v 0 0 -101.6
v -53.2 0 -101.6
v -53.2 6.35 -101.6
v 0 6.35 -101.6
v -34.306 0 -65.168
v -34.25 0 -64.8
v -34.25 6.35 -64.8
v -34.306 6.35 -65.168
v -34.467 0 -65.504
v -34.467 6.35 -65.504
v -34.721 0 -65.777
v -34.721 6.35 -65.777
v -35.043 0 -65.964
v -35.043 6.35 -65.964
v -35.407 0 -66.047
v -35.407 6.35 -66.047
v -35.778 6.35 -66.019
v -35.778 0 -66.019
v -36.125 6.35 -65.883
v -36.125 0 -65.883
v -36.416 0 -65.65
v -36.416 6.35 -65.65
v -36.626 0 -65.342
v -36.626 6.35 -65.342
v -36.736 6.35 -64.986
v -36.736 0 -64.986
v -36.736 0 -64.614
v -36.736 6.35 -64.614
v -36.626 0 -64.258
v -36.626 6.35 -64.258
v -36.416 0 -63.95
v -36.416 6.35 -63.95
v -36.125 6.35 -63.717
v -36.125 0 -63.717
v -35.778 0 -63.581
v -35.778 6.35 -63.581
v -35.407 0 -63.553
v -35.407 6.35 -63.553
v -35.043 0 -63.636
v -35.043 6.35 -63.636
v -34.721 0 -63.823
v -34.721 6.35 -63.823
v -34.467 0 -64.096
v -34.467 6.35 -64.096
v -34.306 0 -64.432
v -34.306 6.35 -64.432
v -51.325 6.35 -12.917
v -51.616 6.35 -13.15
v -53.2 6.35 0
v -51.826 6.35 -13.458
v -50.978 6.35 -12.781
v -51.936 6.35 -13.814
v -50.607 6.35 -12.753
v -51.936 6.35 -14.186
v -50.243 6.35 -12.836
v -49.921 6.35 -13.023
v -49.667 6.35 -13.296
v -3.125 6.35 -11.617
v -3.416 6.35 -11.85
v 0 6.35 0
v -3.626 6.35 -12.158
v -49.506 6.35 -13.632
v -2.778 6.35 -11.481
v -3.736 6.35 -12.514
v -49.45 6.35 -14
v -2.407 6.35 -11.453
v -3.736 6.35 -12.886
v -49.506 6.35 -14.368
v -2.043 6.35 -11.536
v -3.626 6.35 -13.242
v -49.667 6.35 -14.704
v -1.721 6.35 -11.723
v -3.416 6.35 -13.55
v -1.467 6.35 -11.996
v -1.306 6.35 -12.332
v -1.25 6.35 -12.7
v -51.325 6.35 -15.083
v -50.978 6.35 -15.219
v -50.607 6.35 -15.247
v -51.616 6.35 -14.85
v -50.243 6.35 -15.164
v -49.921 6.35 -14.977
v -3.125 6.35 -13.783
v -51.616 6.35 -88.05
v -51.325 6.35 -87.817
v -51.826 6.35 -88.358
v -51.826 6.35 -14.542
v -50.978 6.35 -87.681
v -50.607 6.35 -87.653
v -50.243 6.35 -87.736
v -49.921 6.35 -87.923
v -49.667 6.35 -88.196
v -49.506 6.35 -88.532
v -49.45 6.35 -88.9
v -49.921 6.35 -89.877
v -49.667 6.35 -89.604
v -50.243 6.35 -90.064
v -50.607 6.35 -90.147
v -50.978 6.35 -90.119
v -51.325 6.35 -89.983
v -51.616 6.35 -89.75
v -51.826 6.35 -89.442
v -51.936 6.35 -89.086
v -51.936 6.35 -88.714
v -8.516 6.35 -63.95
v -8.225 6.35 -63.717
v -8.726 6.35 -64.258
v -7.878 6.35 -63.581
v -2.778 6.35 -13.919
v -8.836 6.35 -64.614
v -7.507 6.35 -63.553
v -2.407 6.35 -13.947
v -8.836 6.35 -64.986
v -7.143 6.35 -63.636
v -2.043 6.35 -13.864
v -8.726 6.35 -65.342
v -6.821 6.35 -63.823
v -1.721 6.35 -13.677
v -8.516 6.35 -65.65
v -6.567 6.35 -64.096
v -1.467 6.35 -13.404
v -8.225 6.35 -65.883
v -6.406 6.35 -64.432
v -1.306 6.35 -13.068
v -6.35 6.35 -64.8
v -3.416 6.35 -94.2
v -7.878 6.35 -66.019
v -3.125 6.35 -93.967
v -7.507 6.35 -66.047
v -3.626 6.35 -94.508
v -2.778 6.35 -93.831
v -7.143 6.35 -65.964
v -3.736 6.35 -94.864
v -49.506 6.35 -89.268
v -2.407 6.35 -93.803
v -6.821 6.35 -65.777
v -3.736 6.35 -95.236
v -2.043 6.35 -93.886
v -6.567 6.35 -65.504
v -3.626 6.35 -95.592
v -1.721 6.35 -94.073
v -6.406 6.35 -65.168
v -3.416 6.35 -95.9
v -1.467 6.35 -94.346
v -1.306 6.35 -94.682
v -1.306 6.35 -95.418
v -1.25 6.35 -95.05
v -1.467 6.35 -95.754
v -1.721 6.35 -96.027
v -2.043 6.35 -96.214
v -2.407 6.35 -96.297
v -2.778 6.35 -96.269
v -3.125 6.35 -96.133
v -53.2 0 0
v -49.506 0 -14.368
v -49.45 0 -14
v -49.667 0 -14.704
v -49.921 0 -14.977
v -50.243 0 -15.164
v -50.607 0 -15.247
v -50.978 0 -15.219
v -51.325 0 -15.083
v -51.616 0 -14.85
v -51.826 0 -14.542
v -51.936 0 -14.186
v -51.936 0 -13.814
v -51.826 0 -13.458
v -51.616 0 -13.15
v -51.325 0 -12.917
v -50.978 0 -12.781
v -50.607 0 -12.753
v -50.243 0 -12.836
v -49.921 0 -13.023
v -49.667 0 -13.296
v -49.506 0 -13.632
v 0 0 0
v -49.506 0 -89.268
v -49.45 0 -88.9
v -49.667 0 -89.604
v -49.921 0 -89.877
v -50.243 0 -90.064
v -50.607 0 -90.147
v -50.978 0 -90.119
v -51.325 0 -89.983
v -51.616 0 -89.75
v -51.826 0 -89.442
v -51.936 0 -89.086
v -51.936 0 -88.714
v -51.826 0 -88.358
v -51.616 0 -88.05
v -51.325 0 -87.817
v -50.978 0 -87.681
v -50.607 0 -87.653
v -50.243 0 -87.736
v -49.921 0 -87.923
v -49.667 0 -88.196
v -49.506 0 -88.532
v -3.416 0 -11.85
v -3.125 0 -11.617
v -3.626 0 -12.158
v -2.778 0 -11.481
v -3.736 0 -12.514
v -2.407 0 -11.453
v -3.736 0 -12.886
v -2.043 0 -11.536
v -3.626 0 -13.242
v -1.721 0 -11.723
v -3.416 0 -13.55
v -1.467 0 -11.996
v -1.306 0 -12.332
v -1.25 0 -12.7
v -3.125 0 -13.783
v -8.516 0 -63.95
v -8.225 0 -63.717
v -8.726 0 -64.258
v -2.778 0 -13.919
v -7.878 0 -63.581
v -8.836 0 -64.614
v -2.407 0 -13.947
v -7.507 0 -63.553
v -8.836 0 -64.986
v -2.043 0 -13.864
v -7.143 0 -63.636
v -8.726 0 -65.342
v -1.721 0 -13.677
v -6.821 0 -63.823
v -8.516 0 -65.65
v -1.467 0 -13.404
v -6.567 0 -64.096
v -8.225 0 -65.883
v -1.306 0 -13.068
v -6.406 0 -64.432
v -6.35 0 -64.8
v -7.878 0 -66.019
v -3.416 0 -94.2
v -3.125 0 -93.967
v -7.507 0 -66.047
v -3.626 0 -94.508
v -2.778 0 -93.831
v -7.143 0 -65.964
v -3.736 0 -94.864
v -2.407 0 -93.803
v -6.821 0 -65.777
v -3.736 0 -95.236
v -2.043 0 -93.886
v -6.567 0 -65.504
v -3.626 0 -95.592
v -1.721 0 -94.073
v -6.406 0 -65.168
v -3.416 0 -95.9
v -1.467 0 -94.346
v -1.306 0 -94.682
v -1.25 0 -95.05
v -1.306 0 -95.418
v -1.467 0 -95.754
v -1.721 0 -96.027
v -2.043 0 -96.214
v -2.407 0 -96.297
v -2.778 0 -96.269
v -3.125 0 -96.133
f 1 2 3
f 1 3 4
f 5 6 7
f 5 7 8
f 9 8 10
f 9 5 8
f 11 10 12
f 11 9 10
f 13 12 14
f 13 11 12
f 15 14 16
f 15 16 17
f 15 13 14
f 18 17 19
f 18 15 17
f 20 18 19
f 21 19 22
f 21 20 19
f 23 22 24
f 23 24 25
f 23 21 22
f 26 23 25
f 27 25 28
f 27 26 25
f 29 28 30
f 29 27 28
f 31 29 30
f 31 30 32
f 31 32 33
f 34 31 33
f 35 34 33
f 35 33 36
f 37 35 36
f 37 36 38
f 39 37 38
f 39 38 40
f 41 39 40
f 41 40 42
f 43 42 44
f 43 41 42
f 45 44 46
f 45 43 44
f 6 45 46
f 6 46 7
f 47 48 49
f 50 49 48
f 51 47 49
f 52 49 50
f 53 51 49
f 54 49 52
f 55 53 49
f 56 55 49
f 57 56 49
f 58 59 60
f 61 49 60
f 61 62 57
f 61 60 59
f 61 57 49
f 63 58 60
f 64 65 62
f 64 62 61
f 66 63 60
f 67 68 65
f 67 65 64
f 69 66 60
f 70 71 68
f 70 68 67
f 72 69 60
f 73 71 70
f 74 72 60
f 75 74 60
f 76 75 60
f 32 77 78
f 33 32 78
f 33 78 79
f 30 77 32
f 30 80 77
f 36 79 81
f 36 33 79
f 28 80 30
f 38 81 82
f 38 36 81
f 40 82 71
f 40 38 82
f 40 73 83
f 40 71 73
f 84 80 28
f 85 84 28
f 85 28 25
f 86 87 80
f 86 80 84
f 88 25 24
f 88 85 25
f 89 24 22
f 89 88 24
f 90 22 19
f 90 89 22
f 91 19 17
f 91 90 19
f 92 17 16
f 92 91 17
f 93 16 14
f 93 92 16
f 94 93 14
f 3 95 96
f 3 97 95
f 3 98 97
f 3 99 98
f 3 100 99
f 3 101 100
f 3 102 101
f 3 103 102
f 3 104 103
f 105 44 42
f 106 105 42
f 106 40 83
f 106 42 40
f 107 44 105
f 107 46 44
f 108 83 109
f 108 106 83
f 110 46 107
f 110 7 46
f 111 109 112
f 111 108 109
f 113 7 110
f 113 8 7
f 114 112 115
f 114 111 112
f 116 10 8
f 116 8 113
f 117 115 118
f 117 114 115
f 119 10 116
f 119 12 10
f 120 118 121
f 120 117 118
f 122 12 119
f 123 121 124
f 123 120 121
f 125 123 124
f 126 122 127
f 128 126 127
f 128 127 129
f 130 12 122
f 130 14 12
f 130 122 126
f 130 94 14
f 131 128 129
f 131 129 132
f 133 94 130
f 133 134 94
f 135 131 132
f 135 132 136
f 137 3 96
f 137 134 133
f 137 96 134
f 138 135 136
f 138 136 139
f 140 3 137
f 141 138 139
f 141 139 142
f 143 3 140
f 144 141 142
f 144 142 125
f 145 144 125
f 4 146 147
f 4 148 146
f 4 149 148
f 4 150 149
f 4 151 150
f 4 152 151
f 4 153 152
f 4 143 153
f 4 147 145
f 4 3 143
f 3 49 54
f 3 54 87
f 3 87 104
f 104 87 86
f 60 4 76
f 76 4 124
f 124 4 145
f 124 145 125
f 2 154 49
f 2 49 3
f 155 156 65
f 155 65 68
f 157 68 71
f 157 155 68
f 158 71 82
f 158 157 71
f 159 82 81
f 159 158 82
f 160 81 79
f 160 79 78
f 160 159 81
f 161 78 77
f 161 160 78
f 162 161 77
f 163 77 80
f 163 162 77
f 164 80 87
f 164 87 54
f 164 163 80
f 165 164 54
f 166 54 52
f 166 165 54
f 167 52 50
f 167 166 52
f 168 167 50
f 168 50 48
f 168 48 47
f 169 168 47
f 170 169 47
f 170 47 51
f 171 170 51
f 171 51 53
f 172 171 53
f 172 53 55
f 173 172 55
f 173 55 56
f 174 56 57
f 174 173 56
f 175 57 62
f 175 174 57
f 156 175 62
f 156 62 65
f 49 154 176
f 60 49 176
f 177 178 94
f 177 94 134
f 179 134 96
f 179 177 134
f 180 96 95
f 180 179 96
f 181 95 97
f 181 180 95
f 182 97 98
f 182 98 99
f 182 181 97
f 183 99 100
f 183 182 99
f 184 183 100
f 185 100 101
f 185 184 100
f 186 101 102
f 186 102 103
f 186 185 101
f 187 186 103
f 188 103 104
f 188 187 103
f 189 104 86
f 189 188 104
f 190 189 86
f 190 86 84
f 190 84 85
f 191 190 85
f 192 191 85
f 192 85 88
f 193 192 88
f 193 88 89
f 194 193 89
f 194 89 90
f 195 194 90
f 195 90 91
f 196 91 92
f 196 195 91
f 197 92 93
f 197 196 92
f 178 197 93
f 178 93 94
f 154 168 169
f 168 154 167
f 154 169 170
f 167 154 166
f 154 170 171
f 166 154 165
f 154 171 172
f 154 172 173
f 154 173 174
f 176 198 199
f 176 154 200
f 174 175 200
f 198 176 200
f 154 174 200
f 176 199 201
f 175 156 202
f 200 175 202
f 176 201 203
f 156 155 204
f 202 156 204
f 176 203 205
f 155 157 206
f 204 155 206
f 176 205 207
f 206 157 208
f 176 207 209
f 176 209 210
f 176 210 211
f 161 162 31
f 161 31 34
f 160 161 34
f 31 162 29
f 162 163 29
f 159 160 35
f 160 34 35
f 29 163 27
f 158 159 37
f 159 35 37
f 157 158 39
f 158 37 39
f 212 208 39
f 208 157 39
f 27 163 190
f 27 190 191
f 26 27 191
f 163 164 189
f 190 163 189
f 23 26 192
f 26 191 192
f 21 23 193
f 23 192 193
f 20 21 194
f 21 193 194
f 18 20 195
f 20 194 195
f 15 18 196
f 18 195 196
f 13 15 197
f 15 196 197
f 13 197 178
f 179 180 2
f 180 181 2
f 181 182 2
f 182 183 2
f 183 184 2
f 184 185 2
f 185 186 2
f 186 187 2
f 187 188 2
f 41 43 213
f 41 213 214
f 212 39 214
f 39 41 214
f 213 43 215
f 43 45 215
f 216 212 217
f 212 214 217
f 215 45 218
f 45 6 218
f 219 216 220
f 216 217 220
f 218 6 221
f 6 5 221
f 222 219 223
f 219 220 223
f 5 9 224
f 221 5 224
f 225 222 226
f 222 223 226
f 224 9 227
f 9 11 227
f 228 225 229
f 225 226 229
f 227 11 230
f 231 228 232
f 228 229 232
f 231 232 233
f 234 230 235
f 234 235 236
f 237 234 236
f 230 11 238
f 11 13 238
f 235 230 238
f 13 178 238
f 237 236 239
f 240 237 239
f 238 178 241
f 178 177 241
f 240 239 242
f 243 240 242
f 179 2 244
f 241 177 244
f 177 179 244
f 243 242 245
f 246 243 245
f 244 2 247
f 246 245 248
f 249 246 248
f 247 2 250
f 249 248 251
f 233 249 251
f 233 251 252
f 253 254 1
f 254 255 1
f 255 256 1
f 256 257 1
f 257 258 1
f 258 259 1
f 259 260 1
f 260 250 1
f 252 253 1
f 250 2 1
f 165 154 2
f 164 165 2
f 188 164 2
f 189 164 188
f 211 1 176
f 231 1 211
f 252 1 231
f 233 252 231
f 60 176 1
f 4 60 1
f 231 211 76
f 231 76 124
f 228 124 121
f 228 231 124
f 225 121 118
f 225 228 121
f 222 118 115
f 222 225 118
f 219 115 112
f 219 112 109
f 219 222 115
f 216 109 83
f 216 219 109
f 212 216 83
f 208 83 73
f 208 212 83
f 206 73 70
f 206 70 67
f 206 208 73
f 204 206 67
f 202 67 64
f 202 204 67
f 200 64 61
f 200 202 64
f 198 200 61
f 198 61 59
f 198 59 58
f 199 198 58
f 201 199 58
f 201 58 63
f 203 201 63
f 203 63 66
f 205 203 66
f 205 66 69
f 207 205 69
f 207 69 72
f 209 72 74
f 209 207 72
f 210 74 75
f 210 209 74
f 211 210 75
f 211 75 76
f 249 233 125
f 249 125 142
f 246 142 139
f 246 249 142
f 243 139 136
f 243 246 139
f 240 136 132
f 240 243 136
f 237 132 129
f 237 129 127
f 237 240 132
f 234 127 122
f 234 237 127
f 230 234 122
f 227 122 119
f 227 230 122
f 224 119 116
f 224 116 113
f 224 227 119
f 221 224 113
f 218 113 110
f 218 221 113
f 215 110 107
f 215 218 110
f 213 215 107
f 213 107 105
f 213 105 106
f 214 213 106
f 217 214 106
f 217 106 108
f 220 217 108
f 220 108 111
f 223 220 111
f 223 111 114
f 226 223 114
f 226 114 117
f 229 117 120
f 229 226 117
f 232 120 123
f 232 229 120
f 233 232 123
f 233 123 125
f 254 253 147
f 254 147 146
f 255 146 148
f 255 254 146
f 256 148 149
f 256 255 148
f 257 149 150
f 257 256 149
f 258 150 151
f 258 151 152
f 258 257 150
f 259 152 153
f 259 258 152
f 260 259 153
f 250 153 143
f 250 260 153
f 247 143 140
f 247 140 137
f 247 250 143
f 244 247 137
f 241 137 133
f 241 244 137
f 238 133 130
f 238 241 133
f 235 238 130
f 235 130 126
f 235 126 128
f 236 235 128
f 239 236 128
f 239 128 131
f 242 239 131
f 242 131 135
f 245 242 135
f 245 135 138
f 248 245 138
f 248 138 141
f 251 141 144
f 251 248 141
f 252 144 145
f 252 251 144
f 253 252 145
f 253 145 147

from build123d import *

# Parameters (mm, degrees)
SKETCH1_W           = 53.2
SKETCH1_H           = 101.6
SKETCH1_R           = 1.25
BOSS_EXTRUDE1_DEPTH = 6.35


with BuildPart() as part:
    # Sketch1 → Boss-Extrude1 (new body)
    with BuildSketch(Plane(origin=(0, 0, 0), x_dir=(1, 0, 0), z_dir=(0, 1, 0))):
        with Locations((-26.6, 50.8)):
            Rectangle(SKETCH1_W, SKETCH1_H)
        with Locations((-50.7, 88.9)):
            Circle(SKETCH1_R, mode=Mode.SUBTRACT)
        with Locations((-2.5, 95.05)):
            Circle(SKETCH1_R, mode=Mode.SUBTRACT)
        with Locations((-35.5, 64.8)):
            Circle(SKETCH1_R, mode=Mode.SUBTRACT)
        with Locations((-7.6, 64.8)):
            Circle(SKETCH1_R, mode=Mode.SUBTRACT)
        with Locations((-50.7, 14)):
            Circle(SKETCH1_R, mode=Mode.SUBTRACT)
        with Locations((-2.5, 12.7)):
            Circle(SKETCH1_R, mode=Mode.SUBTRACT)
    extrude(amount=BOSS_EXTRUDE1_DEPTH)


solid = part.part
